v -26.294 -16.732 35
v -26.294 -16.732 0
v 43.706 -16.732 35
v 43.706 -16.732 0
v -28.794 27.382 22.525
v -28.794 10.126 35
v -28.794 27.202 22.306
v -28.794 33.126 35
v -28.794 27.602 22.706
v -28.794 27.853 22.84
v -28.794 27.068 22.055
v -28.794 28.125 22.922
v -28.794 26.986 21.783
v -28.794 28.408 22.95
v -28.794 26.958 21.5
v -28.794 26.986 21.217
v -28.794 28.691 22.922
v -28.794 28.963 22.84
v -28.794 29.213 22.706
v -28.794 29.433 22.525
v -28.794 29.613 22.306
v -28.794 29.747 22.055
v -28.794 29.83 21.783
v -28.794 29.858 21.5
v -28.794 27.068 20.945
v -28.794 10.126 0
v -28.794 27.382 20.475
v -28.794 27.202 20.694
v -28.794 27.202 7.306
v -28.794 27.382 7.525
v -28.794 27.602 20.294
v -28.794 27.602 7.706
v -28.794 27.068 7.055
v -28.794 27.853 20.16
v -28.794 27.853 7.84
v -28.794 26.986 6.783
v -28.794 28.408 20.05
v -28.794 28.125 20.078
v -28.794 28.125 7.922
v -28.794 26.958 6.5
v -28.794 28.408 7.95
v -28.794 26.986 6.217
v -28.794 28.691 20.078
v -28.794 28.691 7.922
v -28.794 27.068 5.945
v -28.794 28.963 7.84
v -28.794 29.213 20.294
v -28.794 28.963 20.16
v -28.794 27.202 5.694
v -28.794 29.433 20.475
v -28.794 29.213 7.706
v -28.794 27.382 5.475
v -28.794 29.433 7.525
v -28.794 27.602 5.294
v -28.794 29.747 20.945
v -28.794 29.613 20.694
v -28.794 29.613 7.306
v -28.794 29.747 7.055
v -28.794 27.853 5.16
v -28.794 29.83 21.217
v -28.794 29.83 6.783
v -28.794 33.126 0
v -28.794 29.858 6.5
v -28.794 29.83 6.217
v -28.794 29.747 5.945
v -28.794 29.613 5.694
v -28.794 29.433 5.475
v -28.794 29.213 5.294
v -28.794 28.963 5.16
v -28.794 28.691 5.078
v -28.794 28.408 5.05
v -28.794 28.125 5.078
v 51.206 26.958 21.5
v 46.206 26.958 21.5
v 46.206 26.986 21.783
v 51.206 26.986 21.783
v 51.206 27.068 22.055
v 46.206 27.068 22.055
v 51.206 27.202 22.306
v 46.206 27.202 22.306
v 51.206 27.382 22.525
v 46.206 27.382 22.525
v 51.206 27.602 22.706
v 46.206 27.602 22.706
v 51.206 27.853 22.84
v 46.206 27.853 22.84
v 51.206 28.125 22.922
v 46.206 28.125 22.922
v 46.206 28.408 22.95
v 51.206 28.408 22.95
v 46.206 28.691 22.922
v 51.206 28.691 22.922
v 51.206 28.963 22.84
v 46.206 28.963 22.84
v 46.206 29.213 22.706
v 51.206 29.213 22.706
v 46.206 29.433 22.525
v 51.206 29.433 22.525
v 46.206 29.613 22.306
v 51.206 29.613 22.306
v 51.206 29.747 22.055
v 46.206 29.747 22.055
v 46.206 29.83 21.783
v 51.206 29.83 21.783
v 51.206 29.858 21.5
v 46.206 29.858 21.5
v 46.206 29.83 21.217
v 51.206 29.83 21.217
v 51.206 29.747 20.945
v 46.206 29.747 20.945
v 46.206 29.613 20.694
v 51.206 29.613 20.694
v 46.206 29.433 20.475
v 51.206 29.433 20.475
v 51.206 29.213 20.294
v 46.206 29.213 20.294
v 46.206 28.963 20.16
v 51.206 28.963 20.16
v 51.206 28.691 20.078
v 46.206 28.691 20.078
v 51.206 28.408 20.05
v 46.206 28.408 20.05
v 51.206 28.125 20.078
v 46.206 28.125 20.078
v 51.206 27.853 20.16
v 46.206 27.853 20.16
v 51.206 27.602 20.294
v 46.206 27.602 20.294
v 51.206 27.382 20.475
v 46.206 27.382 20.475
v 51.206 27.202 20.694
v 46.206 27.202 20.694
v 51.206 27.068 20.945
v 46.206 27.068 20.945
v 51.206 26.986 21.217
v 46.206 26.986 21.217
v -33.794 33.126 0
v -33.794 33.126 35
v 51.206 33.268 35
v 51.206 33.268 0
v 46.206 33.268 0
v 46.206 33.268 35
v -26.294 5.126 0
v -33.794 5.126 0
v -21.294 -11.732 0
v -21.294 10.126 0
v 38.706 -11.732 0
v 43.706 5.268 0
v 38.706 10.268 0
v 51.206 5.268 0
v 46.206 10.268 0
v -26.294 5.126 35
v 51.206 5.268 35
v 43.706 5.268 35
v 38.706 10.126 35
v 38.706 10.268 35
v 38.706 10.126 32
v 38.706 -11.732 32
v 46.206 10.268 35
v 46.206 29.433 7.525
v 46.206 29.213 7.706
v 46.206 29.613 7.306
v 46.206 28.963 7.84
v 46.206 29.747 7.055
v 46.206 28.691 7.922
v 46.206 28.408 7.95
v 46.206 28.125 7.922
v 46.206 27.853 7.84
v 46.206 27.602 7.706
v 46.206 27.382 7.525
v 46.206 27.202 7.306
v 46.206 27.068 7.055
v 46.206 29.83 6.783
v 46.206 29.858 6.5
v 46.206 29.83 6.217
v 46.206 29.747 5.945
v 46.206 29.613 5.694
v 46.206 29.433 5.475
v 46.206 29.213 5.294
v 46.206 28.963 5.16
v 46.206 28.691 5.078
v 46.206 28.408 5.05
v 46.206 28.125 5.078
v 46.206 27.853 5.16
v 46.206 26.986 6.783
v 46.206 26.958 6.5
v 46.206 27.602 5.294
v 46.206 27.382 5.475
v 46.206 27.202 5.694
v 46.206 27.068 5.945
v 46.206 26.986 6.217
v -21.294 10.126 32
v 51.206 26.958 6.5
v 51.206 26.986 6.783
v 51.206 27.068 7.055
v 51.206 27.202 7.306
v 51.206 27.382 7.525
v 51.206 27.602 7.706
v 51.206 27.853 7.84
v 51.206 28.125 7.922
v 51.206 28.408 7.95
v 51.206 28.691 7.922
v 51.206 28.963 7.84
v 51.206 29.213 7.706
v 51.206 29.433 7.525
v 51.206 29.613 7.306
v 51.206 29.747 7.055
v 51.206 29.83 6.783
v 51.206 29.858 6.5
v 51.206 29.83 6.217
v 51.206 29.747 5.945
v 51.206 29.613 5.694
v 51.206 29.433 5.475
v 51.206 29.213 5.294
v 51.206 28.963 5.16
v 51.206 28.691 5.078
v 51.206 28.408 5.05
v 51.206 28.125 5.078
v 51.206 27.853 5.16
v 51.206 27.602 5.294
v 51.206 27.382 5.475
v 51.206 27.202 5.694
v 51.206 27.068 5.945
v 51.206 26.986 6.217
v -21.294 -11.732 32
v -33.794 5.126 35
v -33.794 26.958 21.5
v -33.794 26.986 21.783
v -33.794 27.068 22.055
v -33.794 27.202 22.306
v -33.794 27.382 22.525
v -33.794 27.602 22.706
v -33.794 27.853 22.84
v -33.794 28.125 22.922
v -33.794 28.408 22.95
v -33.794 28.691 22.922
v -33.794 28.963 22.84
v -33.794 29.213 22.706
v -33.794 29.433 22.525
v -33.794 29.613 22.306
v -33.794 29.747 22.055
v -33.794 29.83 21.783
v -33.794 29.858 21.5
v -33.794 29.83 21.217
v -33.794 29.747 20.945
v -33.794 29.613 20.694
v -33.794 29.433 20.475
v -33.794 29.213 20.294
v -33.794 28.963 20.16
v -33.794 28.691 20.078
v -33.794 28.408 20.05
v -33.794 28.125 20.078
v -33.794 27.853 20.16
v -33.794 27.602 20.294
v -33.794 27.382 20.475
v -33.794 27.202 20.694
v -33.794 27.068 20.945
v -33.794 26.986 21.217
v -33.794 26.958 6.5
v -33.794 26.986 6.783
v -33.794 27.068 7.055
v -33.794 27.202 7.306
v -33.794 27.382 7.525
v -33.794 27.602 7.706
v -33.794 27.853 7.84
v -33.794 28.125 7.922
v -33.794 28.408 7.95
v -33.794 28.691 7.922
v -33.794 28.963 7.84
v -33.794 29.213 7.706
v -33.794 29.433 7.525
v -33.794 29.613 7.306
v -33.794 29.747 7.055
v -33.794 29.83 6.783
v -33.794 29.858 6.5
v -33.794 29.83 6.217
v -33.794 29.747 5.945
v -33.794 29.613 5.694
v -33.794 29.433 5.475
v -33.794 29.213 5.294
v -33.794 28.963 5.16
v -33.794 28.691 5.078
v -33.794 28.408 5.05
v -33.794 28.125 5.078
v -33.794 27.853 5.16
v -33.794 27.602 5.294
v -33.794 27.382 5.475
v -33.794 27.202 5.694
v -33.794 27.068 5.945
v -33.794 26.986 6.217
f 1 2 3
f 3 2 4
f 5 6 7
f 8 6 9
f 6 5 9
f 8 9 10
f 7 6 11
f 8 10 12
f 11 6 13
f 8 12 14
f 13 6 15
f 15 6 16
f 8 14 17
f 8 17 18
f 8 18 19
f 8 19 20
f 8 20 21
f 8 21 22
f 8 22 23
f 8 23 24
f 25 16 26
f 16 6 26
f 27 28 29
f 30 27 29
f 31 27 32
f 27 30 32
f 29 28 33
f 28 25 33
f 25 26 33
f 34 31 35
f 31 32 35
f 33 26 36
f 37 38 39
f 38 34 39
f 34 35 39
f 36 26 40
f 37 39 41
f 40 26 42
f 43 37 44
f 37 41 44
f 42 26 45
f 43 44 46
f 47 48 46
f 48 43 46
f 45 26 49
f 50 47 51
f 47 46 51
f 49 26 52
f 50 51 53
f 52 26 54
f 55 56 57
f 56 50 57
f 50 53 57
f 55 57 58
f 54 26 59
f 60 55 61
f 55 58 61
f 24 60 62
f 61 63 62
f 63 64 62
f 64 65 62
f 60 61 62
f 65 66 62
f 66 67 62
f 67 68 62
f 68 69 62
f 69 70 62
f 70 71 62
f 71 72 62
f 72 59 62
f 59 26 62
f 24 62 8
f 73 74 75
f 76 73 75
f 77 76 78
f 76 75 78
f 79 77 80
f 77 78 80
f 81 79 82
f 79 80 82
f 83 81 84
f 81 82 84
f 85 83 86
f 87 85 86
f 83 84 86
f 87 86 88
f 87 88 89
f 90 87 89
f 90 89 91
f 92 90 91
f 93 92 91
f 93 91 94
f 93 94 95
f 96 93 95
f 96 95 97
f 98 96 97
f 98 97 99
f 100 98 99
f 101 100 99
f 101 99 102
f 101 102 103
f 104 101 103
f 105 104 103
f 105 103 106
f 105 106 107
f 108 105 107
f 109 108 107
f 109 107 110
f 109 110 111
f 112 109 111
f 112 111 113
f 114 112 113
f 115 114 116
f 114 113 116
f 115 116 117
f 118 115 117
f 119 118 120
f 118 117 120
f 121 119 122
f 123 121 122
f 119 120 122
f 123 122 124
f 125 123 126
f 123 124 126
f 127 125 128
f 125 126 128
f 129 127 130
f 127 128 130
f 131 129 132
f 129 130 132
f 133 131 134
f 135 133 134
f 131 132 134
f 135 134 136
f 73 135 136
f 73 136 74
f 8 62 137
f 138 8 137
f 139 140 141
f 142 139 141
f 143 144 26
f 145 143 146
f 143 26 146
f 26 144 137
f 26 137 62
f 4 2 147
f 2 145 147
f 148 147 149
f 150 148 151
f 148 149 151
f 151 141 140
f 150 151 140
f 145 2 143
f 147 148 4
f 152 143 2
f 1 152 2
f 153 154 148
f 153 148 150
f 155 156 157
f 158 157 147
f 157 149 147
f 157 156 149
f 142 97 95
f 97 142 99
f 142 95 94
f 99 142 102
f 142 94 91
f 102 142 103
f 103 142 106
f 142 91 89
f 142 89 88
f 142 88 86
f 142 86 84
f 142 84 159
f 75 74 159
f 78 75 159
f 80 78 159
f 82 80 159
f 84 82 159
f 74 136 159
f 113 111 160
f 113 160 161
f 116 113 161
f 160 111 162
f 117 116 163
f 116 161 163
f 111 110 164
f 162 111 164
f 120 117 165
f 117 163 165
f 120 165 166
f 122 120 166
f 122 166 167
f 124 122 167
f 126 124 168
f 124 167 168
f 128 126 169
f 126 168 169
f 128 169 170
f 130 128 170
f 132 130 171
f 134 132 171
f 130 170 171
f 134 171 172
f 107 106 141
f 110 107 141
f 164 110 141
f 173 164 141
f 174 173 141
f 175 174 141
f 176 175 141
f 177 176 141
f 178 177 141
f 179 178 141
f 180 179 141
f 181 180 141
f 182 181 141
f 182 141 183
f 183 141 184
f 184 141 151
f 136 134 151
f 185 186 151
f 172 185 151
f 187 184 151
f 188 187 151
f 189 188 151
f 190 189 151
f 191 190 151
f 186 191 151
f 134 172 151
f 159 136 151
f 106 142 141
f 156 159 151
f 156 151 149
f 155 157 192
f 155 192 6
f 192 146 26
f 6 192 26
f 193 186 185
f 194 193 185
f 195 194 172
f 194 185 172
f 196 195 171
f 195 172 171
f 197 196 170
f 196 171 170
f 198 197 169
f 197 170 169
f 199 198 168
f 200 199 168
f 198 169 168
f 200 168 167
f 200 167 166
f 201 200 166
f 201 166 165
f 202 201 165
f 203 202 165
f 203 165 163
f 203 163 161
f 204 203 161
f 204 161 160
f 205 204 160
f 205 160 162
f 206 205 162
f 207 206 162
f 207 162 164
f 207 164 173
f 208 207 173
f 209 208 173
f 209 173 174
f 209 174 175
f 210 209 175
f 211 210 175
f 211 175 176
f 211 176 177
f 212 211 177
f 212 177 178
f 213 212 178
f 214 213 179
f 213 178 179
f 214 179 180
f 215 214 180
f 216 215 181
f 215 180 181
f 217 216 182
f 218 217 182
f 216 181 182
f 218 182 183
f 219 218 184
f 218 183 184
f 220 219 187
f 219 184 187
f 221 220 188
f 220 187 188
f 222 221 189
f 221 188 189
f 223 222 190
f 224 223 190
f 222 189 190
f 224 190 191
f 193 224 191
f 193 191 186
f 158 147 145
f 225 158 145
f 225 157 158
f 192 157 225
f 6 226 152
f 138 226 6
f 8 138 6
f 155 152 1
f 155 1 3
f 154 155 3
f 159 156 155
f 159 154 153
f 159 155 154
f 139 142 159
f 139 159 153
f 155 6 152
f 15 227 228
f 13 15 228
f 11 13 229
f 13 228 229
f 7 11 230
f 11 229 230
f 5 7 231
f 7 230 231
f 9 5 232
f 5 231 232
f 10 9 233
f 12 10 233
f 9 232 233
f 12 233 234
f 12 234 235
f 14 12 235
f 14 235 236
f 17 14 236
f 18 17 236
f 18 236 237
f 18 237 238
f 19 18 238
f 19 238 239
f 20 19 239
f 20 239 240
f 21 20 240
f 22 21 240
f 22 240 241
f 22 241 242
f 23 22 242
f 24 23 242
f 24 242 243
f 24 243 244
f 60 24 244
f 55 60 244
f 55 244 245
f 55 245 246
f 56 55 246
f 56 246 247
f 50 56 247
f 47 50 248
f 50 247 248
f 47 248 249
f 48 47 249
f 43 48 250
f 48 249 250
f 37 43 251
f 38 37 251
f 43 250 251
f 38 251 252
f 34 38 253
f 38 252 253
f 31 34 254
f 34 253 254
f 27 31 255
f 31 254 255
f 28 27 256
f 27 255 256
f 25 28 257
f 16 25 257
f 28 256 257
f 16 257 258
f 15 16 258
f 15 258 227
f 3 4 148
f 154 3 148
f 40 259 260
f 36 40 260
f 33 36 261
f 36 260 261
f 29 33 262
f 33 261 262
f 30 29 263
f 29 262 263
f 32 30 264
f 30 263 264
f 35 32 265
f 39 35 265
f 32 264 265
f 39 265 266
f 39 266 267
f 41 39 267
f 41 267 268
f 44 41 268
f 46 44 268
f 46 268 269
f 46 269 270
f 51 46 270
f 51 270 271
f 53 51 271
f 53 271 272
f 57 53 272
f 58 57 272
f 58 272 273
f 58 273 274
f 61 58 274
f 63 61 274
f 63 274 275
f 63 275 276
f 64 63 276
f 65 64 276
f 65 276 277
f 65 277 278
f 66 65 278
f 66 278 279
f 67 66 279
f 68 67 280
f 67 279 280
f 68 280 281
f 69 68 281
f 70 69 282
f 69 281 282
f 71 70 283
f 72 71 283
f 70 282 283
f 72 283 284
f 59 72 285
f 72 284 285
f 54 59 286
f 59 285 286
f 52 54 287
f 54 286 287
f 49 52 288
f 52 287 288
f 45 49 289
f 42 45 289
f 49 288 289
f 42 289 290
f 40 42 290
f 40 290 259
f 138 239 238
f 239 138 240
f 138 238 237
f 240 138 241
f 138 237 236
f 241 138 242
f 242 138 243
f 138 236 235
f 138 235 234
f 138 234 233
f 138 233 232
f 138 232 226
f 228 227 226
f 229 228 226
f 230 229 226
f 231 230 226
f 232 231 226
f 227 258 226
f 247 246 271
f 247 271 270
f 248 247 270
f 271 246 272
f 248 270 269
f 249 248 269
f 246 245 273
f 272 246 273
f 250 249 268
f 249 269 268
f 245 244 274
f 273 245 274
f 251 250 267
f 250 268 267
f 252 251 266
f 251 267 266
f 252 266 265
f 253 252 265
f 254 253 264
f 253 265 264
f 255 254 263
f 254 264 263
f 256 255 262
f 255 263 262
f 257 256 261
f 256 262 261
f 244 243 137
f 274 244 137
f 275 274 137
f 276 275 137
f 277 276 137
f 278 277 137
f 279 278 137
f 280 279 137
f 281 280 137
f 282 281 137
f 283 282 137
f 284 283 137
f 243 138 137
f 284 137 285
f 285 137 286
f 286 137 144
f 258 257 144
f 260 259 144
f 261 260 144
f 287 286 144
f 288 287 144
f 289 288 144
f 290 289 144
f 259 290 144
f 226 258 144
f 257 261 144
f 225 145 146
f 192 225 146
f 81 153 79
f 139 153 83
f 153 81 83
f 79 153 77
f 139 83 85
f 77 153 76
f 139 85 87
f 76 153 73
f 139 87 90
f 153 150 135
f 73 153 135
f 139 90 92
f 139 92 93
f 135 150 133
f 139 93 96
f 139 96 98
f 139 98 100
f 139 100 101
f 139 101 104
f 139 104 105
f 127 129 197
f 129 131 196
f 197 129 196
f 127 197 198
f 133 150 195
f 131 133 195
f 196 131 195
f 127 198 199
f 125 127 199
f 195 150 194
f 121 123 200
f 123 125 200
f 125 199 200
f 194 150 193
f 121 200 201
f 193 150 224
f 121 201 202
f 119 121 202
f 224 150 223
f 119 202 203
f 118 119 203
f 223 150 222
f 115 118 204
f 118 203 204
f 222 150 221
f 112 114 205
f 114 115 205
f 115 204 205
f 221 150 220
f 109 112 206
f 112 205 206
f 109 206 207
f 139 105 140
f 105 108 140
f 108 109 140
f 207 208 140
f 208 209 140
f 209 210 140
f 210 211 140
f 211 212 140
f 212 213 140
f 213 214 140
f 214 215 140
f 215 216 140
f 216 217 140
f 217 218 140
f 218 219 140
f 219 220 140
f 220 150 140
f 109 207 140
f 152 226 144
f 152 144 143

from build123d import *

# Parameters (mm, degrees)
EXTRUDE_1_DEPTH     = 35
EXTRUDE_2_DEPTH     = 3
SKETCH_3_R          = 1.45
CUT_EXTRUDE_1_DEPTH = 98.758571233


with BuildPart() as part:
    # 草圖1 → 填料-伸長1 (new body)
    with BuildSketch(Plane.XY):
        Polygon((-21.293611747, 10.125539125), (-28.793611747, 10.125539125), (-28.793611747, 33.125539125), (-33.793611747, 33.125539125), (-33.793611747, 5.125539125), (-26.293611747, 5.125539125), (-26.293611747, -16.732324255), (43.706388253, -16.732324255), (43.706388253, 5.267675745), (51.206388253, 5.267675745), (51.206388253, 33.267675745), (46.206388253, 33.267675745), (46.206388253, 10.267675745), (38.706388253, 10.267675745), (38.706388253, -11.732324255), (-21.293611747, -11.732324255), align=None)
    extrude(amount=EXTRUDE_1_DEPTH)

    # 草圖2 → 填料-伸長2 (add)
    with BuildSketch(Plane.XY.offset(35)):
        Polygon((51.206388253, 10.125539125), (51.206388253, 5.267675745), (43.706388253, 5.267675745), (43.706388253, -16.732324255), (-26.293611747, -16.732324255), (-26.293611747, 5.125539125), (-33.793611747, 5.125539125), (-33.793611747, 10.125539125), align=None)
    extrude(amount=-EXTRUDE_2_DEPTH)

    # 草圖3 → 除料-伸長1 (cut, through all)
    with BuildSketch(Plane.ZY.offset(33.793611747)):
        with Locations(Location((6.5, 28.407675745, 0), (0, 0, 270))):
            Circle(SKETCH_3_R)
        with Locations(Location((21.5, 28.407675745, 0), (0, 0, 270))):
            Circle(SKETCH_3_R)
    extrude(amount=-CUT_EXTRUDE_1_DEPTH, mode=Mode.SUBTRACT)


solid = part.part
